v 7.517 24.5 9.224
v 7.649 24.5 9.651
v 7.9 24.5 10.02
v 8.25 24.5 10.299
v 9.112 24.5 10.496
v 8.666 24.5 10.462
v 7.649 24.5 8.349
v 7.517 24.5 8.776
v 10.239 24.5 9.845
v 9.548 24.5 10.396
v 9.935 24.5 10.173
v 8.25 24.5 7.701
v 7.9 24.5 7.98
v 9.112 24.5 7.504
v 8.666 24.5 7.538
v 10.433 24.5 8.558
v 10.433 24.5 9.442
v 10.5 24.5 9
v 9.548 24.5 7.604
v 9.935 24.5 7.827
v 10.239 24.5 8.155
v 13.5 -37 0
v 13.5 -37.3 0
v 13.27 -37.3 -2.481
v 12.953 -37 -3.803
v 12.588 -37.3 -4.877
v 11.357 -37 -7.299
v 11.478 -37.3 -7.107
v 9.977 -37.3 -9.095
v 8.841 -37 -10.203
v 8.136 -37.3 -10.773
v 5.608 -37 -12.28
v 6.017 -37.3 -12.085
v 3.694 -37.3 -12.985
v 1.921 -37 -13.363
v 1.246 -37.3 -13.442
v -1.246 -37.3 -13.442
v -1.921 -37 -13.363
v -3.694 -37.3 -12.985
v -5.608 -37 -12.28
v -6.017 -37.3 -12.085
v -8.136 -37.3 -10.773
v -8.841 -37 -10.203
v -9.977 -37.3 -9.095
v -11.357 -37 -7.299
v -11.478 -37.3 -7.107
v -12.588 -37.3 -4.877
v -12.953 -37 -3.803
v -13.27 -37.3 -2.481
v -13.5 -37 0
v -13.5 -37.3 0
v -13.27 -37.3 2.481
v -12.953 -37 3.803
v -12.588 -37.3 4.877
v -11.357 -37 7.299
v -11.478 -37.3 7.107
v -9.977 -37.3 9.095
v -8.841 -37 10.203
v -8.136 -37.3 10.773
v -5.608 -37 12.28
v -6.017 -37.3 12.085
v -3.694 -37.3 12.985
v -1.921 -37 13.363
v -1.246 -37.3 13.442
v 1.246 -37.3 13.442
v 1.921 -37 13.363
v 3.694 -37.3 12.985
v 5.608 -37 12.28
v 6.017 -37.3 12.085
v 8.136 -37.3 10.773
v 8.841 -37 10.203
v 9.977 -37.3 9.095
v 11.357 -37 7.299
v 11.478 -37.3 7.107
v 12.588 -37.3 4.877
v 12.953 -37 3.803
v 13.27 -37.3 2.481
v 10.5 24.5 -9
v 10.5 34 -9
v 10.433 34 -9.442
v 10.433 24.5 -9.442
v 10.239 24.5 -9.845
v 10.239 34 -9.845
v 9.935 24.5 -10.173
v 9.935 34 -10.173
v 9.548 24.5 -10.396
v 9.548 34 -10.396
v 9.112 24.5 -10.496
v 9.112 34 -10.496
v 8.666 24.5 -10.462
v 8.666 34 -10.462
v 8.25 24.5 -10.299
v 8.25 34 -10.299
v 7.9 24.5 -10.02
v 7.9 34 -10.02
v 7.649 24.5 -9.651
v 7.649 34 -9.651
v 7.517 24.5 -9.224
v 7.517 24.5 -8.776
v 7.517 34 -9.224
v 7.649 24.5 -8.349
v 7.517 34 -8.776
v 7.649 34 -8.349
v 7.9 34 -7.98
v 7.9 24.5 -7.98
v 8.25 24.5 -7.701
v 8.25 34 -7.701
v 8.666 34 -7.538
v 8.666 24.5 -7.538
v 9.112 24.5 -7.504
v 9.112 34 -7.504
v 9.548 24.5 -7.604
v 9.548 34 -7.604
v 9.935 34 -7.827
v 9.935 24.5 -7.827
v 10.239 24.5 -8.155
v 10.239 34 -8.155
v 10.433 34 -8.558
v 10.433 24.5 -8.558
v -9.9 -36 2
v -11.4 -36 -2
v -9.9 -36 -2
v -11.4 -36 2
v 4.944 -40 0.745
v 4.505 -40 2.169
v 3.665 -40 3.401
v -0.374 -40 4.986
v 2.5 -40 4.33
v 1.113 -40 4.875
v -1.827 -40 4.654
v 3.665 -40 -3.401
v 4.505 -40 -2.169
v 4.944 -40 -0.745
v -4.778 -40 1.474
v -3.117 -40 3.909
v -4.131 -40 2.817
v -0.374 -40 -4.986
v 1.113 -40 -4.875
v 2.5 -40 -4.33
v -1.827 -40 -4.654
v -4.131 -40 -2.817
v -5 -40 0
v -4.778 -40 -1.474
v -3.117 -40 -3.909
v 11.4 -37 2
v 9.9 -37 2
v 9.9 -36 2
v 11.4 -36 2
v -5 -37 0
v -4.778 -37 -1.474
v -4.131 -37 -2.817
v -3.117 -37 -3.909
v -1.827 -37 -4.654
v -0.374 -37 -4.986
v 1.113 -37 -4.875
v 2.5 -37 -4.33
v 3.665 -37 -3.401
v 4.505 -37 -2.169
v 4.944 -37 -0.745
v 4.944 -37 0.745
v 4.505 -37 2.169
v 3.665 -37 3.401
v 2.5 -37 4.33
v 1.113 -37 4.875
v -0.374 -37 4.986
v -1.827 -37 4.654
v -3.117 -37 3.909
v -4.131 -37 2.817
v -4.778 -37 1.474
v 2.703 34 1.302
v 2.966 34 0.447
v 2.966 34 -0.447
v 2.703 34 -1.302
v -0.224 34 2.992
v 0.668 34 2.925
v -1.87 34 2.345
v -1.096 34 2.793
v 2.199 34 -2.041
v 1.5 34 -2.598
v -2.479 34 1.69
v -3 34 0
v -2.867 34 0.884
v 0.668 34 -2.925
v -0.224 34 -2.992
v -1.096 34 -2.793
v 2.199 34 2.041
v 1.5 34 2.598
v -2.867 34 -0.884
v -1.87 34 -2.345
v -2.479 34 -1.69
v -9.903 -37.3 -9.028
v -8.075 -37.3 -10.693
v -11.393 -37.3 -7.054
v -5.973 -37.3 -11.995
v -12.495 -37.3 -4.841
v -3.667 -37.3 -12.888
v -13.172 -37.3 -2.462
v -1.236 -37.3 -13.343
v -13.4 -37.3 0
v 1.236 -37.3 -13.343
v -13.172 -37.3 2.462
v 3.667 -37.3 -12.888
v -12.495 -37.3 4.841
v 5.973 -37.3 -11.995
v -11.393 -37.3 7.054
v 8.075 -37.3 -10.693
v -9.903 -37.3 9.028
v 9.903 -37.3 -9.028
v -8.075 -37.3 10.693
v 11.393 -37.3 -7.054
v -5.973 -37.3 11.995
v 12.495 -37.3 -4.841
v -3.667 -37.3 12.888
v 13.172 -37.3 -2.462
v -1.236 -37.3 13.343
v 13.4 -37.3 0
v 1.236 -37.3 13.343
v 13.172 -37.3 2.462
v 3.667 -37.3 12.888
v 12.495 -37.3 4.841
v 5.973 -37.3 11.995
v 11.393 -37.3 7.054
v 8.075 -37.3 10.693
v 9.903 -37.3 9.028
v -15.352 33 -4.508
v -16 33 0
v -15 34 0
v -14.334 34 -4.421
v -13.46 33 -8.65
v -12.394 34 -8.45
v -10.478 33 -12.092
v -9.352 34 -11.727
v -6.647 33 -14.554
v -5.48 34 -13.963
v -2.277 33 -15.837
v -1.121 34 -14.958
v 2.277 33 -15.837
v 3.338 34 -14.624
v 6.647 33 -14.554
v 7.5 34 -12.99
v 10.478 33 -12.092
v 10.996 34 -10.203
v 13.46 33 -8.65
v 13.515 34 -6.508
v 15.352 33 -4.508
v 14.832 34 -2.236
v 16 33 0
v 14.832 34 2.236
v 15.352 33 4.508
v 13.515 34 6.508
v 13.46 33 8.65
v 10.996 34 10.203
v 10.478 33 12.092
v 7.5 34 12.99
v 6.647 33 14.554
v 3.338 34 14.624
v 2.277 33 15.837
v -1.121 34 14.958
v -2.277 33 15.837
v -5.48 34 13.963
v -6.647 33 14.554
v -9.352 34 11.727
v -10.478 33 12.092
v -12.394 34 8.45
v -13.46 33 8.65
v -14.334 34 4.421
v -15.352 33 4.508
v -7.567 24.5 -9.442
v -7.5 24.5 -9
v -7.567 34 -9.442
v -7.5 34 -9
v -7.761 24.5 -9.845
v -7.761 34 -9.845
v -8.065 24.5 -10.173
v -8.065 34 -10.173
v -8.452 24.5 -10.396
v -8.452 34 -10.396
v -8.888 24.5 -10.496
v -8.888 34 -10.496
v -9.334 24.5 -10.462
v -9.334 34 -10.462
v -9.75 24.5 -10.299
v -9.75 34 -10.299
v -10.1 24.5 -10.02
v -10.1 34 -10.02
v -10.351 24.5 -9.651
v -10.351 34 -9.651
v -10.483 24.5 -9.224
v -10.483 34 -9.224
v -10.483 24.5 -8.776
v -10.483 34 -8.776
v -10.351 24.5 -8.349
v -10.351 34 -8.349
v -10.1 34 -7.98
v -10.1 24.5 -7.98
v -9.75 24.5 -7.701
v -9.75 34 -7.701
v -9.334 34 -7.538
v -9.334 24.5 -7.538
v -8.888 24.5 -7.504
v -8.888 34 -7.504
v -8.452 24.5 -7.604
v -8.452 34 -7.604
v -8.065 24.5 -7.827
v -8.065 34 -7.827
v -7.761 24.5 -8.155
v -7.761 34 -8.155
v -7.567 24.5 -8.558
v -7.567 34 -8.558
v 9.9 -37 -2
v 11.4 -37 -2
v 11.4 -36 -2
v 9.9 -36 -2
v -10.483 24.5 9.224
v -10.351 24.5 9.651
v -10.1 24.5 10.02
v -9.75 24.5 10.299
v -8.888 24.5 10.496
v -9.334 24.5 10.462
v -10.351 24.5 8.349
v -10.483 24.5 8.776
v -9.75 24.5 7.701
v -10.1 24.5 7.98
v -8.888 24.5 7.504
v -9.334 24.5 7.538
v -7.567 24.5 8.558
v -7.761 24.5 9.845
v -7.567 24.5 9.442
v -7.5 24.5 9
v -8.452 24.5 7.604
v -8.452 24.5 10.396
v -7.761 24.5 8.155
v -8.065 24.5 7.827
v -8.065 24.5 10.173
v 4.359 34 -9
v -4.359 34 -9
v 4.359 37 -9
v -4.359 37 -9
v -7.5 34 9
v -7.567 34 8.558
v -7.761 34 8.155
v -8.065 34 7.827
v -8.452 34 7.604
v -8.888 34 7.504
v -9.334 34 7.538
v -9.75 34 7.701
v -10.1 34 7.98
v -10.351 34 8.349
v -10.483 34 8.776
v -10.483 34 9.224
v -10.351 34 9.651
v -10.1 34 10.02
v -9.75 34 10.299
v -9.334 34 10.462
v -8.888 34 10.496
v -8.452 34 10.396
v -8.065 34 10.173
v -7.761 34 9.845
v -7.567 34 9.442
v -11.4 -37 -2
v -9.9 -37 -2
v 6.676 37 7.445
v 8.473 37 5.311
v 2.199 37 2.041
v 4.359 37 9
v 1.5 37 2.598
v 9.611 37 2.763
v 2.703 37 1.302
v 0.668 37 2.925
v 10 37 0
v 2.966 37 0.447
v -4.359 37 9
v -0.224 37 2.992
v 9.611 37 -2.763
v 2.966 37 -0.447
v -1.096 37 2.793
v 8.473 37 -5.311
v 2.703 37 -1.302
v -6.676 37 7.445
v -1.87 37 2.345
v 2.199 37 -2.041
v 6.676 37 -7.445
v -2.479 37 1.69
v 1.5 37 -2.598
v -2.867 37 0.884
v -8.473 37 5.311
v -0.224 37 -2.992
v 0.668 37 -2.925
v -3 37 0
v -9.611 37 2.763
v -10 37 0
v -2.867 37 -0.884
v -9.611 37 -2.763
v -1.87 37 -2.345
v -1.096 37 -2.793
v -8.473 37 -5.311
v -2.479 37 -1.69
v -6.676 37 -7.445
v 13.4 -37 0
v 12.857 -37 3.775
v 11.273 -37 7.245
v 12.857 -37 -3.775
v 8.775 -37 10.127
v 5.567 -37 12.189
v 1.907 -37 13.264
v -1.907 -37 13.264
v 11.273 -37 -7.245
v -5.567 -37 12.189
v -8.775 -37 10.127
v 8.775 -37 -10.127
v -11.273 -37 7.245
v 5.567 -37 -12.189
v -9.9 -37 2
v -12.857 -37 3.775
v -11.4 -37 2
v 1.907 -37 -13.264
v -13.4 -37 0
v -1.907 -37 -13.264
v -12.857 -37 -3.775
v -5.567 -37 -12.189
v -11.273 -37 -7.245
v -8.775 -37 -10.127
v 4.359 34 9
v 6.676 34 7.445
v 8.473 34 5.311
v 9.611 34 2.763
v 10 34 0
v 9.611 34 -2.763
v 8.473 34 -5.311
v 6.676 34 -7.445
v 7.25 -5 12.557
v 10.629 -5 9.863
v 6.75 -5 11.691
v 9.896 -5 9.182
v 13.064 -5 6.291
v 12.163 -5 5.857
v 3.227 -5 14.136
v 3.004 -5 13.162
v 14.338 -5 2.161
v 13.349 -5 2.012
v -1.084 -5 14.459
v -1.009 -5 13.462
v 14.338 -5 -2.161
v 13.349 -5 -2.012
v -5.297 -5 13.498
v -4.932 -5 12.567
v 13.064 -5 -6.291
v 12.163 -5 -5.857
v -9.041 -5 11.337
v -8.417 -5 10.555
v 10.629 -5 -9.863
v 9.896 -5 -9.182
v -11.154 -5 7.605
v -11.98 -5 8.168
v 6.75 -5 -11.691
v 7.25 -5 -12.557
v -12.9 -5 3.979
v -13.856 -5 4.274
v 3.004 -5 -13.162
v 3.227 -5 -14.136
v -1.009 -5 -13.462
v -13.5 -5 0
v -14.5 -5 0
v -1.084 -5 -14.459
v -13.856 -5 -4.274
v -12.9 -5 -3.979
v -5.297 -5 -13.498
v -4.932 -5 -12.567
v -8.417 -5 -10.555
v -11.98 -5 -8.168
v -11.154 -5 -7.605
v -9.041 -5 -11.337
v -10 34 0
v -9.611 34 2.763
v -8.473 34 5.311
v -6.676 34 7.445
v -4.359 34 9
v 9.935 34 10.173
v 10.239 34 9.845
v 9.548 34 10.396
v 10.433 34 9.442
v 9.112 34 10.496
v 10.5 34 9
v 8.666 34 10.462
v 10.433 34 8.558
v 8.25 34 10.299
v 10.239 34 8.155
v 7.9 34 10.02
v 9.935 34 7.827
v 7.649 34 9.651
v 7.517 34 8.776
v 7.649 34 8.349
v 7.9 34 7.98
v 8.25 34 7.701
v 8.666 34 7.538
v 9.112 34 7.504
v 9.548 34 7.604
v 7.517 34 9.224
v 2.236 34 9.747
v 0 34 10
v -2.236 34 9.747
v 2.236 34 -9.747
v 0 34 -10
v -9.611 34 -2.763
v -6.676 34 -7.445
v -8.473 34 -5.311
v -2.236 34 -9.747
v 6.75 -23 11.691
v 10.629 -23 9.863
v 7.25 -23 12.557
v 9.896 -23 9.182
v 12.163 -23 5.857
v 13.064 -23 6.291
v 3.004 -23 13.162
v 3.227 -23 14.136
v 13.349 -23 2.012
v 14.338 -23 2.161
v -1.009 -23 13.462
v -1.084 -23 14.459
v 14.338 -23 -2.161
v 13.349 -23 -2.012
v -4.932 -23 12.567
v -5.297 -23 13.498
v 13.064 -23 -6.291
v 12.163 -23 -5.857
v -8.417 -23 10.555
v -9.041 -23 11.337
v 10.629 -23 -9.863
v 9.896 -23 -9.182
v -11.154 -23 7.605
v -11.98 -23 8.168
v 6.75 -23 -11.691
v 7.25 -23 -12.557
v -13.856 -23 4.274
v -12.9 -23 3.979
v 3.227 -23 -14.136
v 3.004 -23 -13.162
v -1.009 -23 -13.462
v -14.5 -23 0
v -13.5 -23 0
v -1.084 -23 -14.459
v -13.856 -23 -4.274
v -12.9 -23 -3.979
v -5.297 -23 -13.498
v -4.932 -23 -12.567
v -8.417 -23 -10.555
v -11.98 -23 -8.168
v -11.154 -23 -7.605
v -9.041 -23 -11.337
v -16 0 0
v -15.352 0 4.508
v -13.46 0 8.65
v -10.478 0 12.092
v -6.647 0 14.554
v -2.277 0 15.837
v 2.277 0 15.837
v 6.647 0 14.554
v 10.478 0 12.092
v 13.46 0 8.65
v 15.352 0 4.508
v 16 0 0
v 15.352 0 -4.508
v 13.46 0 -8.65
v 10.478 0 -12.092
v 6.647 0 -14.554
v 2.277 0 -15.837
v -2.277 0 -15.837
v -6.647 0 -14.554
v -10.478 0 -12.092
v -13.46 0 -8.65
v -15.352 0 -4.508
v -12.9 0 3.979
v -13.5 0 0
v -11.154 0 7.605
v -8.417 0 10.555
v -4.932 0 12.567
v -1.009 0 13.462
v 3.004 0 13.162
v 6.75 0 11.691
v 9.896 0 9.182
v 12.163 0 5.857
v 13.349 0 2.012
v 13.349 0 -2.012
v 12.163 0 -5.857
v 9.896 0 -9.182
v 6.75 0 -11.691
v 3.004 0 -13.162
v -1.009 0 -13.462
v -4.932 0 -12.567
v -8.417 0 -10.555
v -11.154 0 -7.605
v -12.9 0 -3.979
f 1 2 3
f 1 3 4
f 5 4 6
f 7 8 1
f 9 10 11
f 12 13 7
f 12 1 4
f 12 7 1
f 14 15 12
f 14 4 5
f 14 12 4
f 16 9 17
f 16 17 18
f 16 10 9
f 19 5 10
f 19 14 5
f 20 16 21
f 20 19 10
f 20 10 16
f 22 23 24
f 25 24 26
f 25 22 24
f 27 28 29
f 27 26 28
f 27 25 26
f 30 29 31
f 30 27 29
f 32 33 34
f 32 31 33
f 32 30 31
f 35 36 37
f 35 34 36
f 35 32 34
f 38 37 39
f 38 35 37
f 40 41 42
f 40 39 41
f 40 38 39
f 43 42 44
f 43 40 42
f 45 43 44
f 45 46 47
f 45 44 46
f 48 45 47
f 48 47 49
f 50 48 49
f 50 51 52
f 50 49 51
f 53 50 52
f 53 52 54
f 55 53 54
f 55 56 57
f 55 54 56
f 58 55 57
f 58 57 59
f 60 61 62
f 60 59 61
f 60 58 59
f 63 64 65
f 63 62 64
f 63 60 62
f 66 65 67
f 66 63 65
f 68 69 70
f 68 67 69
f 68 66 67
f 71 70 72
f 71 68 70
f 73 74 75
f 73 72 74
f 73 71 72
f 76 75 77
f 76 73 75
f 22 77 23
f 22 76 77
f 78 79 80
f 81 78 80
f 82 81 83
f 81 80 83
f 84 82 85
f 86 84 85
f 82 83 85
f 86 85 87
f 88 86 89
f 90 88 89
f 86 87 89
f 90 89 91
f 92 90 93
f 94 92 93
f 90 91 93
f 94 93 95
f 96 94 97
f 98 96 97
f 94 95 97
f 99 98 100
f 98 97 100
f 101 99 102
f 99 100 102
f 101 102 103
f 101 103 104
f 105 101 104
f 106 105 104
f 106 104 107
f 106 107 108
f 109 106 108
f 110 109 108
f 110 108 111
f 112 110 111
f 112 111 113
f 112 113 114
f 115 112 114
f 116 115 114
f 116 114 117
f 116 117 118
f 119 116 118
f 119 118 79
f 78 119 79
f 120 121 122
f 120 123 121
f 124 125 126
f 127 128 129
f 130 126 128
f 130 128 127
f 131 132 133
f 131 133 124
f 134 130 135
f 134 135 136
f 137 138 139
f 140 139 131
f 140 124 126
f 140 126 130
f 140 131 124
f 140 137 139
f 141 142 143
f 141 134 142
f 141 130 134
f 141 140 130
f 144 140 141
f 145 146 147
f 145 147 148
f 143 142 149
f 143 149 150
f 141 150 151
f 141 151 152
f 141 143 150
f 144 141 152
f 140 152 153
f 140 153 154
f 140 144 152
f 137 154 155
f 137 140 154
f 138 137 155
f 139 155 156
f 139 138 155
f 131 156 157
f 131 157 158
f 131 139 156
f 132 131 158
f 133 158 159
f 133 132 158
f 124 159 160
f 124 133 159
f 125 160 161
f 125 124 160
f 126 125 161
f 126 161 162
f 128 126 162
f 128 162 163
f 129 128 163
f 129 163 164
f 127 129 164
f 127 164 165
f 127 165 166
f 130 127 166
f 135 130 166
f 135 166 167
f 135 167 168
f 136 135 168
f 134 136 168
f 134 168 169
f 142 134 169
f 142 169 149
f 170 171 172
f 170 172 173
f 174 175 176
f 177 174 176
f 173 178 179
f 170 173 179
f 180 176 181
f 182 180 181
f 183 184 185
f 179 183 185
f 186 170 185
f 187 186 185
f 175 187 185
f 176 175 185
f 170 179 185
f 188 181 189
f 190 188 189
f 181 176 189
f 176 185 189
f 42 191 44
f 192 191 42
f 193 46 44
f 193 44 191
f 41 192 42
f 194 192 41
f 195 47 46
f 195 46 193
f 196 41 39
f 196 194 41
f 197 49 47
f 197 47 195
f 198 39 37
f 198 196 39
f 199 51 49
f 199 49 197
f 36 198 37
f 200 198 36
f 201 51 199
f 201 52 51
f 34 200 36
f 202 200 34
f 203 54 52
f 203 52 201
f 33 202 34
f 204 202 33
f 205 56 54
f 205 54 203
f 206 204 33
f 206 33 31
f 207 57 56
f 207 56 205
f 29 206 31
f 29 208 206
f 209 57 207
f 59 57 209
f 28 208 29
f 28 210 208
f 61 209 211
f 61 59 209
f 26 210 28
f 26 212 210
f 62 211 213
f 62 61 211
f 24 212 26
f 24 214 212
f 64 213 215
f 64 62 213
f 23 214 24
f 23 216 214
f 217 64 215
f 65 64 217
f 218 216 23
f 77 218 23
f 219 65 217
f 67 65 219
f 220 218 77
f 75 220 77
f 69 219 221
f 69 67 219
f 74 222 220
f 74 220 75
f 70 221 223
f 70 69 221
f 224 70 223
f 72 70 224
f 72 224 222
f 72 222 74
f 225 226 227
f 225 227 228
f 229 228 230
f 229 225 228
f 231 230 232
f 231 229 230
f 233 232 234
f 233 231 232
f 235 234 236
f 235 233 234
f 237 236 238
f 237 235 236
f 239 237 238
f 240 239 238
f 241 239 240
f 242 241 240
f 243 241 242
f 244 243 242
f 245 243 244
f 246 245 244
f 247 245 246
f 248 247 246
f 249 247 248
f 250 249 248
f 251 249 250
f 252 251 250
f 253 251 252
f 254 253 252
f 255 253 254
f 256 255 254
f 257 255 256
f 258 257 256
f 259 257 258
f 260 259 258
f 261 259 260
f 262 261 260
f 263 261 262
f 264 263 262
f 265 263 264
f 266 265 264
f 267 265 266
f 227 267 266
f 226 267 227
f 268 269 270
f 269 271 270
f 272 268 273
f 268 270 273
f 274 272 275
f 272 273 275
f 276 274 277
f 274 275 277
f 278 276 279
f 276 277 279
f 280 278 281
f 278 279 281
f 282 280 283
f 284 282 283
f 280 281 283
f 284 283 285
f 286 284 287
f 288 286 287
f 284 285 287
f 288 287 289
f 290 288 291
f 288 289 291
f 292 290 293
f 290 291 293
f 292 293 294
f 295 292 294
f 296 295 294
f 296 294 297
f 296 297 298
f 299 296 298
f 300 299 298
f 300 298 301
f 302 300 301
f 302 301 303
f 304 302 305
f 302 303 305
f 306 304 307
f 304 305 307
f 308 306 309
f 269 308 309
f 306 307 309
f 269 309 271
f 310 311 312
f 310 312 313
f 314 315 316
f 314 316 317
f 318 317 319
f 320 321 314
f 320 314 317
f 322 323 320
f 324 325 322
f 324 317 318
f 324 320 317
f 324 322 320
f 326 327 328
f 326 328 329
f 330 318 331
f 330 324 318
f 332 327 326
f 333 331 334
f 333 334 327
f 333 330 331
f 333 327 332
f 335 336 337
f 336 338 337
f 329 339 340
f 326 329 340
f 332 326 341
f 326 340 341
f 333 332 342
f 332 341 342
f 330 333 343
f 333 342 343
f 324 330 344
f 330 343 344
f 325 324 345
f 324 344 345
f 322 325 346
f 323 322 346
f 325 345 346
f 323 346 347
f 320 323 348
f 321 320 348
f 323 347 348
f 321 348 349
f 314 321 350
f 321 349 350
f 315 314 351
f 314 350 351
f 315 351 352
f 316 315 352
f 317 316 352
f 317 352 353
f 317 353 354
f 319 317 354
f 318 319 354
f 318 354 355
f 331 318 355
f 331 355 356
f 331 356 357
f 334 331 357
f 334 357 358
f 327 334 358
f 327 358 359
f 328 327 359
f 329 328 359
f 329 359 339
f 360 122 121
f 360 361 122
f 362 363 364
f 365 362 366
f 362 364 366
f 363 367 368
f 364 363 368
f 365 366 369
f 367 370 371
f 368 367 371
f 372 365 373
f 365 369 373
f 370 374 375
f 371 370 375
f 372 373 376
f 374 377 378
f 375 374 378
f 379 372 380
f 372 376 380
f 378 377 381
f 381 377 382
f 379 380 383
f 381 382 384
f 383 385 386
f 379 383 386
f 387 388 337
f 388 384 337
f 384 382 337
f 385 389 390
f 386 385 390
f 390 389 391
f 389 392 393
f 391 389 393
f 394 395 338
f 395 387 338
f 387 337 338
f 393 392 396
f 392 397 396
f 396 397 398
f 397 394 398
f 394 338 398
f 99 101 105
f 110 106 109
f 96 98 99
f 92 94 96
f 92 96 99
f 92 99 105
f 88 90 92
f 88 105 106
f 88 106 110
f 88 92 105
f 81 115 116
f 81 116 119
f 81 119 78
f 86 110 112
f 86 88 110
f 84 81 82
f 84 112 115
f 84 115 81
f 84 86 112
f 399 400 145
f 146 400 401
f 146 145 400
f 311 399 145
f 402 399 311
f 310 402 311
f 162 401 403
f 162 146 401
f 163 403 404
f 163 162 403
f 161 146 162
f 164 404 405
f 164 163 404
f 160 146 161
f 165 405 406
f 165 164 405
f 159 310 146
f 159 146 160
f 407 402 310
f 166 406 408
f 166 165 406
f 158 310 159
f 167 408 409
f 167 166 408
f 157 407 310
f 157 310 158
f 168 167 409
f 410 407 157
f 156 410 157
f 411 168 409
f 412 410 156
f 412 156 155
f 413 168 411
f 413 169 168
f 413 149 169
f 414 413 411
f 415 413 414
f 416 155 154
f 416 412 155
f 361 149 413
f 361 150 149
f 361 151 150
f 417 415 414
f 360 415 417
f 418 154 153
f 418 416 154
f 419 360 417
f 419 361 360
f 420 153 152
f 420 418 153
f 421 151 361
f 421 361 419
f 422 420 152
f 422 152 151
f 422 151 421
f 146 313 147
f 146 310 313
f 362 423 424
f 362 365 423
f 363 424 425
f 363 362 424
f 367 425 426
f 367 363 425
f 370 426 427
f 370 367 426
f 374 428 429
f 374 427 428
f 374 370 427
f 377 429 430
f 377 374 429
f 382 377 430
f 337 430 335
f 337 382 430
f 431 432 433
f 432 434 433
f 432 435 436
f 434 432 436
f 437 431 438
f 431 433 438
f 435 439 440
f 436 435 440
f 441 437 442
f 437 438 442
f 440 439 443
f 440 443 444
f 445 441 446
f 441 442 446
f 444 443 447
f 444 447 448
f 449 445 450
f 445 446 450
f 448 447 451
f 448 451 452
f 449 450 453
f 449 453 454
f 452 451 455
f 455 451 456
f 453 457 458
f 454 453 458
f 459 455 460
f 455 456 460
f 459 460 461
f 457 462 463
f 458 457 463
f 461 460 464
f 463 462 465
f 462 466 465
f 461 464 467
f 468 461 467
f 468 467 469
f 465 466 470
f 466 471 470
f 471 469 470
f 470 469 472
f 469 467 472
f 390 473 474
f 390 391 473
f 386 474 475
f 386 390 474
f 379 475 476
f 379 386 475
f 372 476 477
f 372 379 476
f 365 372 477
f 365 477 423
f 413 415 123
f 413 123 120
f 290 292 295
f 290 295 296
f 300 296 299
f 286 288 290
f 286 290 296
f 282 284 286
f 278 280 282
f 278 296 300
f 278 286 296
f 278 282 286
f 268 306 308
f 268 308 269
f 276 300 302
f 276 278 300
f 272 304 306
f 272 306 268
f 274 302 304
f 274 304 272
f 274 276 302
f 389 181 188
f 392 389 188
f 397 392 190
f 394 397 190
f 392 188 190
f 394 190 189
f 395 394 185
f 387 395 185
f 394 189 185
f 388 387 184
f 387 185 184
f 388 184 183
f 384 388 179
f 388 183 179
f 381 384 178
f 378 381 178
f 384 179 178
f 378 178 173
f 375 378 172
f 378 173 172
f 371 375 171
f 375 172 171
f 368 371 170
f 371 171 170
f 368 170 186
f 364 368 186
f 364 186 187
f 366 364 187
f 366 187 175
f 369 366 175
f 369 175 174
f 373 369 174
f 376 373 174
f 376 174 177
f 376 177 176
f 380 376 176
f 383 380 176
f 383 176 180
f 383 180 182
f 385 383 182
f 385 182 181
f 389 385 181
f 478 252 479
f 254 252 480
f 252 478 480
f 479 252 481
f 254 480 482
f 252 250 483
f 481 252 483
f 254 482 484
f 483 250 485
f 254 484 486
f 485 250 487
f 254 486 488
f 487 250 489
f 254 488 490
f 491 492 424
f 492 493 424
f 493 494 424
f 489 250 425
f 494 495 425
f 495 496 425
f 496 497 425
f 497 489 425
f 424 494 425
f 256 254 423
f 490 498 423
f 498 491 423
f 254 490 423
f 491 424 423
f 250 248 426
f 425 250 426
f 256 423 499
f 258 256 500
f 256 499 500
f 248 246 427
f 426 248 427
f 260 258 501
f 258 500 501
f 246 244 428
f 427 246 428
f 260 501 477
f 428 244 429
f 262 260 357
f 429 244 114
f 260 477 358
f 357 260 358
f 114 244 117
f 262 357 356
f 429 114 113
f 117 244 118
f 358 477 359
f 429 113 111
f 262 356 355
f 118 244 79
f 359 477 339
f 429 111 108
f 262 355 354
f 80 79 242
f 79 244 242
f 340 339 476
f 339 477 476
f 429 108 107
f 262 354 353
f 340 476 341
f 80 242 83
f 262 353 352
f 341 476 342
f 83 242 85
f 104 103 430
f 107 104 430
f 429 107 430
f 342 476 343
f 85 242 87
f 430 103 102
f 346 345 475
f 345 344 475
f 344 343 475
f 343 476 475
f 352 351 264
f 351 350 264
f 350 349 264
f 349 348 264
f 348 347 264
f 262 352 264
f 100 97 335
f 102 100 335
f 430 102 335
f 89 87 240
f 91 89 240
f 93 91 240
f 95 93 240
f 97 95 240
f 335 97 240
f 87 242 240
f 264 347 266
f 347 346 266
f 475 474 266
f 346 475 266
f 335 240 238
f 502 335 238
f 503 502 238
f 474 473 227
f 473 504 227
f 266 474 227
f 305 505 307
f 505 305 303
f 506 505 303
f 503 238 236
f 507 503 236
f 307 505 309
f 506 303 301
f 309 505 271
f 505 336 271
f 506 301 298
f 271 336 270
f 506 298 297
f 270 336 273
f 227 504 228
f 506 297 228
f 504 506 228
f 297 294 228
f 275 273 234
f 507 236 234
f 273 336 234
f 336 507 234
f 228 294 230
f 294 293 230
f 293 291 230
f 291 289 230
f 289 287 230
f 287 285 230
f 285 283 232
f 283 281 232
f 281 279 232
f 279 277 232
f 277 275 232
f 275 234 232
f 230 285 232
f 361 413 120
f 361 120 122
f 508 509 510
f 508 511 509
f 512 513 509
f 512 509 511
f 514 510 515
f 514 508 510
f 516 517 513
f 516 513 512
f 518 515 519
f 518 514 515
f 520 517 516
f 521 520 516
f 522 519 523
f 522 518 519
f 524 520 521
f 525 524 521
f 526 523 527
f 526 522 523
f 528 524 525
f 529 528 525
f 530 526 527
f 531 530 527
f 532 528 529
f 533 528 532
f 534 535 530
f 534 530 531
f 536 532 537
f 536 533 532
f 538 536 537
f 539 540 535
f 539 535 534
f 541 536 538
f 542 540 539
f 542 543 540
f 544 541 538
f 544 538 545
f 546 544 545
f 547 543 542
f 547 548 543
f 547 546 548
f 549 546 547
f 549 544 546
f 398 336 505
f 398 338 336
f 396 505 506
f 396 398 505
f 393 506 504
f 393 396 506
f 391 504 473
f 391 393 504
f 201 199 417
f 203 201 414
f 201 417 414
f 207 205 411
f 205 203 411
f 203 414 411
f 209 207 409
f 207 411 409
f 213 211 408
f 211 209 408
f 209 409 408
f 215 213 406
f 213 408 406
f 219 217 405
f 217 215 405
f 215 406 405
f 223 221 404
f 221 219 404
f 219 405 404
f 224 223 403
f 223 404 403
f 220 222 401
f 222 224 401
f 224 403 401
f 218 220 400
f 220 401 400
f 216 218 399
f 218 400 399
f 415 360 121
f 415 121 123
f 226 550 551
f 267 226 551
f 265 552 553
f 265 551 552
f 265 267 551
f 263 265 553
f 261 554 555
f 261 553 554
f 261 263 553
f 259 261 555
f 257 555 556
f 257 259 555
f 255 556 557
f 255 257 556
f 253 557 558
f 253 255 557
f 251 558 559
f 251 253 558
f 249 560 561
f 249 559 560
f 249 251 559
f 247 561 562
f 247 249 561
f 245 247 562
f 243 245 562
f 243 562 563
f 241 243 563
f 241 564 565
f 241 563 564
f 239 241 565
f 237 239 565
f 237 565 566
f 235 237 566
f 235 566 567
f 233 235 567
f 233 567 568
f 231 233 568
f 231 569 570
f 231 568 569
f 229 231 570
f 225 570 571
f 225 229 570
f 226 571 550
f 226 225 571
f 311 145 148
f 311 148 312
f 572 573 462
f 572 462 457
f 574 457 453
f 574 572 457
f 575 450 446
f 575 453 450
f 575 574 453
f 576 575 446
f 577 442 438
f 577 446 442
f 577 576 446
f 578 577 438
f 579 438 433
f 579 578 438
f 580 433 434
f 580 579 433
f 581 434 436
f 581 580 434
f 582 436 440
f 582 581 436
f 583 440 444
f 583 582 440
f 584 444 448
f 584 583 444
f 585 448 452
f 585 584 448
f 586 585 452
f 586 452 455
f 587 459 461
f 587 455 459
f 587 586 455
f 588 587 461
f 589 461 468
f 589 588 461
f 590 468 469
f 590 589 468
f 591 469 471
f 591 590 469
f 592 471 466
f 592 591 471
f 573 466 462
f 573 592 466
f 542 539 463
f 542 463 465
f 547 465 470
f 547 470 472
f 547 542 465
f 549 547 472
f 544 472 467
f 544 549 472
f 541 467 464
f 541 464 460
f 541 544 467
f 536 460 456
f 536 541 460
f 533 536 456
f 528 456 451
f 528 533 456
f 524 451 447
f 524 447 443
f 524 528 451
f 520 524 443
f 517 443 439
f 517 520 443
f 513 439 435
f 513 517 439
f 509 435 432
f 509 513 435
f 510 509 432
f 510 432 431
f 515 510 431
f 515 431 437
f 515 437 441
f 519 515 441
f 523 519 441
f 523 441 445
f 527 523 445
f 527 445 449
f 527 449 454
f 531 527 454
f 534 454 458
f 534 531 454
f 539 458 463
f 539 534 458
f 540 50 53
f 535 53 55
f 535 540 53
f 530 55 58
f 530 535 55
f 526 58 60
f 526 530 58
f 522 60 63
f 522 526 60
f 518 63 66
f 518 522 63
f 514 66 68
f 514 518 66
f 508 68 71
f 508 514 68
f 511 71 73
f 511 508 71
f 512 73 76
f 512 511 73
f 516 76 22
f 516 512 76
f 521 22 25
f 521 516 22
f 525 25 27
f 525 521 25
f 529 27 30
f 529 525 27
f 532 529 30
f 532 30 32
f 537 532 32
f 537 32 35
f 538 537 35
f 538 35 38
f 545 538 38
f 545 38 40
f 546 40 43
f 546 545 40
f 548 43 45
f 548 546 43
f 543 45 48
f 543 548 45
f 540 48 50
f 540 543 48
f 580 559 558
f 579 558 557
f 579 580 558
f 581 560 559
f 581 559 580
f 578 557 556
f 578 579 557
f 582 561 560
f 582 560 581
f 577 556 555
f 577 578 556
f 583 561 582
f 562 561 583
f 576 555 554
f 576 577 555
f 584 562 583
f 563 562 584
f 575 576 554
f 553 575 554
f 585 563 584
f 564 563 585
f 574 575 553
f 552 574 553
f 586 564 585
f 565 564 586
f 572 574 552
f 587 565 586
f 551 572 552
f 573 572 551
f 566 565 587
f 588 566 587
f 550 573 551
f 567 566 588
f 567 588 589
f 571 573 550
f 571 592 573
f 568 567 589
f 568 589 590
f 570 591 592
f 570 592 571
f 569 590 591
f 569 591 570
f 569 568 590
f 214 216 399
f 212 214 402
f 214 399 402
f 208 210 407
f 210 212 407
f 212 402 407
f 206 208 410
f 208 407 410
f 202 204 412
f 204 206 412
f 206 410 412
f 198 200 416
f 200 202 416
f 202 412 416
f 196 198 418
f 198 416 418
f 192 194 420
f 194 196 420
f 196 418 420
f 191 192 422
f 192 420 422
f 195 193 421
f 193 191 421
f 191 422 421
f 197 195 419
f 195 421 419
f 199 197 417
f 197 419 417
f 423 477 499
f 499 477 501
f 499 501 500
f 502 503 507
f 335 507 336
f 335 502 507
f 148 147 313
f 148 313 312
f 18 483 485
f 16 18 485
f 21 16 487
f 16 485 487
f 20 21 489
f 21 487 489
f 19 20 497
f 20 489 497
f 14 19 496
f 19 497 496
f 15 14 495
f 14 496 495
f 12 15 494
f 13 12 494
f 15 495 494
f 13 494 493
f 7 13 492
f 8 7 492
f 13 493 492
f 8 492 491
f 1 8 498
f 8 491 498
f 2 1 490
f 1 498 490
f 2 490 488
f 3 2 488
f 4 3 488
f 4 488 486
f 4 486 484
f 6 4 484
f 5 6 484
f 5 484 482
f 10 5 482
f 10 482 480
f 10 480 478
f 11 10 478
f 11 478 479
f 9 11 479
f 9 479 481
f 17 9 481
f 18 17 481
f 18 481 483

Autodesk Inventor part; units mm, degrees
ref_plane "YZ Plane" through (0, 0, 0) normal (1, 0, 0) x (0, 1, 0)
ref_plane "XZ Plane" through (0, 0, 0) normal (0, 1, 0) x (-1, 0, 0)
ref_plane "XY Plane" through (0, 0, 0) normal (0, 0, 1) x (1, 0, 0)
sketch "スケッチ1" plane through (0, 0, 0) normal (0, 0, 1) x (1, 0, 0)
  line L0 (0, 0) -> (-16, 0)
  line L1 (-16, 0) -> (-16, 34)
  line L2 (-16, 34) -> (0, 34)
  line L3 (0, 34) -> (0, 0)
  line L4 (0, 34) -> (-10, 34)
  line L5 (-10, 34) -> (-10, 37)
  line L6 (-10, 37) -> (0, 37)
  line L7 (0, 37) -> (0, 34)
  line L8 (0, 37) -> (-5, 37)
  line L9 (-5, 34) -> (0, 34)
  line L10 (0, 34) -> (0, 37)
  line L11 (-3, 37) -> (-3, 34)
  line L12 (-13.5, 0) -> (0, 0)
  line L13 (0, 0) -> (0, -37)
  line L14 (0, -37) -> (-13.5, -37)
  line L15 (-13.5, -37) -> (-13.5, 0)
  line L16 (-13.5, 0) -> (-14.5, 0)
  line L17 (-13.5, -23) -> (-13.5, 0)
  line L18 (-13.5, -5) -> (-14.5, -5)
  line L19 (-14.5, -5) -> (-14.5, -23)
  line L20 (-14.5, -23) -> (-13.5, -23)
  line L21 (-13.5, -23) -> (-13.5, -5)
  line L22 (0, -37) -> (-5, -37)
  line L23 (-5, -37) -> (-5, -40)
  line L24 (-5, -40) -> (0, -40)
  line L25 (0, -40) -> (0, -37)
  dimension "d0" = 16
  dimension "d1" = 34
  dimension "d2" = 10
  dimension "d4" = 3
  dimension "d5" = 3
  dimension "d6" = 13.5
  dimension "d7" = 0
  dimension "d10" = 37
  dimension "d11" = 5
  dimension "d12" = 14
  dimension "d13" = 1
  dimension "d14" = 3
  dimension "d15" = 5
revolve "回転1" add sketch "スケッチ1" angle 360 about axis through (0, 34, 0) along (0, -1, 0) contours L13 L14 L15 L0 | L0 L1 L2 L3 | L25 L24 L23 L14 | L15 L20 L19 L18 | L2 L5 L6 L11
chamfer "面取り1" distance 1 angle 45 1 edges at (16, 34, 0)
sketch "スケッチ2" plane through (0, -37, 0) normal (0, -1, 0) x (1, 0, 0)
  circle A0 centre (0, 0) radius 5 projected
  circle A1 centre (0, 0) radius 13.4
  circle A2 centre (0, 0) radius 13.5
  circle A3 centre (0, 0) radius 13.5 projected
  line L0 (-9.9, -2) -> (-11.4, -2)
  line L1 (-11.4, -2) -> (-11.4, 2)
  line L2 (-11.4, 2) -> (-9.9, 2)
  line L3 (-9.9, 2) -> (-9.9, -2)
  line L4 (-9.9, -2) -> (-11.4, 2) construction
  line L5 (-11.4, -2) -> (-9.9, 2) construction
  line L6 (11.4, -2) -> (9.9, -2)
  line L7 (9.9, -2) -> (9.9, 2)
  line L8 (9.9, 2) -> (11.4, 2)
  line L9 (11.4, 2) -> (11.4, -2)
  line L10 (11.4, -2) -> (9.9, 2) construction
  line L11 (9.9, -2) -> (11.4, 2) construction
  line L12 (-13.4, 0) -> (0, 0)
  line L13 (0, 0) -> (13.4, 0)
  point P0 (-10.65, 0)
  point P1 (10.65, 0)
  dimension "d21" = 0
  dimension "d22" = 0.1
  dimension "d23" = 1.5
  dimension "d24" = 1.5
  dimension "d25" = 4
  dimension "d26" = 4
  dimension "d27" = 0
  dimension "d28" = 2
  dimension "d29" = 2
extrude "押し出し1" add sketch "スケッチ2" along normal blind 0.3
extrude "押し出し2" cut sketch "スケッチ2" against normal blind 1 contours L13 L9 L6 L7 | L7 L8 L9 L13 | L12 L1 L2 L3 | L3 L0 L1 L12
sketch "スケッチ3" plane through (0, 34, 0) normal (0, 1, 0) x (1, 0, 0)
  circle A0 centre (0, 0) radius 15 projected
  circle A1 centre (-9, -9) radius 1.5
  circle A2 centre (-9, 9) radius 1.5
  circle A3 centre (9, 9) radius 1.5
  circle A4 centre (9, -9) radius 1.5
  line L0 (9, -9) -> (-9, -9)
  line L1 (-9, -9) -> (-9, 9)
  point P0 (0, 0)
  dimension "d54" = 18
  dimension "d55" = 18
  dimension "d56" = 18
  dimension "d57" = 18
  dimension "d58" = 0
  dimension "d59" = 3
  dimension "d60" = 3
  dimension "d61" = 3
  dimension "d62" = 3
  dimension "d63" = 9
  dimension "d64" = 9
extrude "押し出し5" cut sketch "スケッチ3" against normal blind 9.5 contours L0 L1 A1 | A2 | A1 L1 L0 | A4 | A3
sketch "スケッチ6" plane through (0, 37, 0) normal (0, 1, 0) x (1, 0, 0)
  circle A0 centre (0, 0) radius 10 projected
  line L0 (-4.3589, -9) -> (4.3589, -9)
  line L1 (-4.3589, 9) -> (4.3589, 9)
  line L2 (0, 10) -> (0, 9)
  line L3 (0, -9) -> (0, -10)
  arc A1 (-4.3589, -9) -> (4.3589, -9) centre (0, 0) ccw
  arc A2 (4.3589, 9) -> (-4.3589, 9) centre (0, 0) ccw
  point P0 (0, 0)
  dimension "d67" = 1
  dimension "d68" = 1
extrude "押し出し6" cut sketch "スケッチ6" against normal blind 3 contours L1 L2 A0 | A0 L3 L0 | L2 L1 A0 | A0 L0 L3
properties part number "モーター100：1"
